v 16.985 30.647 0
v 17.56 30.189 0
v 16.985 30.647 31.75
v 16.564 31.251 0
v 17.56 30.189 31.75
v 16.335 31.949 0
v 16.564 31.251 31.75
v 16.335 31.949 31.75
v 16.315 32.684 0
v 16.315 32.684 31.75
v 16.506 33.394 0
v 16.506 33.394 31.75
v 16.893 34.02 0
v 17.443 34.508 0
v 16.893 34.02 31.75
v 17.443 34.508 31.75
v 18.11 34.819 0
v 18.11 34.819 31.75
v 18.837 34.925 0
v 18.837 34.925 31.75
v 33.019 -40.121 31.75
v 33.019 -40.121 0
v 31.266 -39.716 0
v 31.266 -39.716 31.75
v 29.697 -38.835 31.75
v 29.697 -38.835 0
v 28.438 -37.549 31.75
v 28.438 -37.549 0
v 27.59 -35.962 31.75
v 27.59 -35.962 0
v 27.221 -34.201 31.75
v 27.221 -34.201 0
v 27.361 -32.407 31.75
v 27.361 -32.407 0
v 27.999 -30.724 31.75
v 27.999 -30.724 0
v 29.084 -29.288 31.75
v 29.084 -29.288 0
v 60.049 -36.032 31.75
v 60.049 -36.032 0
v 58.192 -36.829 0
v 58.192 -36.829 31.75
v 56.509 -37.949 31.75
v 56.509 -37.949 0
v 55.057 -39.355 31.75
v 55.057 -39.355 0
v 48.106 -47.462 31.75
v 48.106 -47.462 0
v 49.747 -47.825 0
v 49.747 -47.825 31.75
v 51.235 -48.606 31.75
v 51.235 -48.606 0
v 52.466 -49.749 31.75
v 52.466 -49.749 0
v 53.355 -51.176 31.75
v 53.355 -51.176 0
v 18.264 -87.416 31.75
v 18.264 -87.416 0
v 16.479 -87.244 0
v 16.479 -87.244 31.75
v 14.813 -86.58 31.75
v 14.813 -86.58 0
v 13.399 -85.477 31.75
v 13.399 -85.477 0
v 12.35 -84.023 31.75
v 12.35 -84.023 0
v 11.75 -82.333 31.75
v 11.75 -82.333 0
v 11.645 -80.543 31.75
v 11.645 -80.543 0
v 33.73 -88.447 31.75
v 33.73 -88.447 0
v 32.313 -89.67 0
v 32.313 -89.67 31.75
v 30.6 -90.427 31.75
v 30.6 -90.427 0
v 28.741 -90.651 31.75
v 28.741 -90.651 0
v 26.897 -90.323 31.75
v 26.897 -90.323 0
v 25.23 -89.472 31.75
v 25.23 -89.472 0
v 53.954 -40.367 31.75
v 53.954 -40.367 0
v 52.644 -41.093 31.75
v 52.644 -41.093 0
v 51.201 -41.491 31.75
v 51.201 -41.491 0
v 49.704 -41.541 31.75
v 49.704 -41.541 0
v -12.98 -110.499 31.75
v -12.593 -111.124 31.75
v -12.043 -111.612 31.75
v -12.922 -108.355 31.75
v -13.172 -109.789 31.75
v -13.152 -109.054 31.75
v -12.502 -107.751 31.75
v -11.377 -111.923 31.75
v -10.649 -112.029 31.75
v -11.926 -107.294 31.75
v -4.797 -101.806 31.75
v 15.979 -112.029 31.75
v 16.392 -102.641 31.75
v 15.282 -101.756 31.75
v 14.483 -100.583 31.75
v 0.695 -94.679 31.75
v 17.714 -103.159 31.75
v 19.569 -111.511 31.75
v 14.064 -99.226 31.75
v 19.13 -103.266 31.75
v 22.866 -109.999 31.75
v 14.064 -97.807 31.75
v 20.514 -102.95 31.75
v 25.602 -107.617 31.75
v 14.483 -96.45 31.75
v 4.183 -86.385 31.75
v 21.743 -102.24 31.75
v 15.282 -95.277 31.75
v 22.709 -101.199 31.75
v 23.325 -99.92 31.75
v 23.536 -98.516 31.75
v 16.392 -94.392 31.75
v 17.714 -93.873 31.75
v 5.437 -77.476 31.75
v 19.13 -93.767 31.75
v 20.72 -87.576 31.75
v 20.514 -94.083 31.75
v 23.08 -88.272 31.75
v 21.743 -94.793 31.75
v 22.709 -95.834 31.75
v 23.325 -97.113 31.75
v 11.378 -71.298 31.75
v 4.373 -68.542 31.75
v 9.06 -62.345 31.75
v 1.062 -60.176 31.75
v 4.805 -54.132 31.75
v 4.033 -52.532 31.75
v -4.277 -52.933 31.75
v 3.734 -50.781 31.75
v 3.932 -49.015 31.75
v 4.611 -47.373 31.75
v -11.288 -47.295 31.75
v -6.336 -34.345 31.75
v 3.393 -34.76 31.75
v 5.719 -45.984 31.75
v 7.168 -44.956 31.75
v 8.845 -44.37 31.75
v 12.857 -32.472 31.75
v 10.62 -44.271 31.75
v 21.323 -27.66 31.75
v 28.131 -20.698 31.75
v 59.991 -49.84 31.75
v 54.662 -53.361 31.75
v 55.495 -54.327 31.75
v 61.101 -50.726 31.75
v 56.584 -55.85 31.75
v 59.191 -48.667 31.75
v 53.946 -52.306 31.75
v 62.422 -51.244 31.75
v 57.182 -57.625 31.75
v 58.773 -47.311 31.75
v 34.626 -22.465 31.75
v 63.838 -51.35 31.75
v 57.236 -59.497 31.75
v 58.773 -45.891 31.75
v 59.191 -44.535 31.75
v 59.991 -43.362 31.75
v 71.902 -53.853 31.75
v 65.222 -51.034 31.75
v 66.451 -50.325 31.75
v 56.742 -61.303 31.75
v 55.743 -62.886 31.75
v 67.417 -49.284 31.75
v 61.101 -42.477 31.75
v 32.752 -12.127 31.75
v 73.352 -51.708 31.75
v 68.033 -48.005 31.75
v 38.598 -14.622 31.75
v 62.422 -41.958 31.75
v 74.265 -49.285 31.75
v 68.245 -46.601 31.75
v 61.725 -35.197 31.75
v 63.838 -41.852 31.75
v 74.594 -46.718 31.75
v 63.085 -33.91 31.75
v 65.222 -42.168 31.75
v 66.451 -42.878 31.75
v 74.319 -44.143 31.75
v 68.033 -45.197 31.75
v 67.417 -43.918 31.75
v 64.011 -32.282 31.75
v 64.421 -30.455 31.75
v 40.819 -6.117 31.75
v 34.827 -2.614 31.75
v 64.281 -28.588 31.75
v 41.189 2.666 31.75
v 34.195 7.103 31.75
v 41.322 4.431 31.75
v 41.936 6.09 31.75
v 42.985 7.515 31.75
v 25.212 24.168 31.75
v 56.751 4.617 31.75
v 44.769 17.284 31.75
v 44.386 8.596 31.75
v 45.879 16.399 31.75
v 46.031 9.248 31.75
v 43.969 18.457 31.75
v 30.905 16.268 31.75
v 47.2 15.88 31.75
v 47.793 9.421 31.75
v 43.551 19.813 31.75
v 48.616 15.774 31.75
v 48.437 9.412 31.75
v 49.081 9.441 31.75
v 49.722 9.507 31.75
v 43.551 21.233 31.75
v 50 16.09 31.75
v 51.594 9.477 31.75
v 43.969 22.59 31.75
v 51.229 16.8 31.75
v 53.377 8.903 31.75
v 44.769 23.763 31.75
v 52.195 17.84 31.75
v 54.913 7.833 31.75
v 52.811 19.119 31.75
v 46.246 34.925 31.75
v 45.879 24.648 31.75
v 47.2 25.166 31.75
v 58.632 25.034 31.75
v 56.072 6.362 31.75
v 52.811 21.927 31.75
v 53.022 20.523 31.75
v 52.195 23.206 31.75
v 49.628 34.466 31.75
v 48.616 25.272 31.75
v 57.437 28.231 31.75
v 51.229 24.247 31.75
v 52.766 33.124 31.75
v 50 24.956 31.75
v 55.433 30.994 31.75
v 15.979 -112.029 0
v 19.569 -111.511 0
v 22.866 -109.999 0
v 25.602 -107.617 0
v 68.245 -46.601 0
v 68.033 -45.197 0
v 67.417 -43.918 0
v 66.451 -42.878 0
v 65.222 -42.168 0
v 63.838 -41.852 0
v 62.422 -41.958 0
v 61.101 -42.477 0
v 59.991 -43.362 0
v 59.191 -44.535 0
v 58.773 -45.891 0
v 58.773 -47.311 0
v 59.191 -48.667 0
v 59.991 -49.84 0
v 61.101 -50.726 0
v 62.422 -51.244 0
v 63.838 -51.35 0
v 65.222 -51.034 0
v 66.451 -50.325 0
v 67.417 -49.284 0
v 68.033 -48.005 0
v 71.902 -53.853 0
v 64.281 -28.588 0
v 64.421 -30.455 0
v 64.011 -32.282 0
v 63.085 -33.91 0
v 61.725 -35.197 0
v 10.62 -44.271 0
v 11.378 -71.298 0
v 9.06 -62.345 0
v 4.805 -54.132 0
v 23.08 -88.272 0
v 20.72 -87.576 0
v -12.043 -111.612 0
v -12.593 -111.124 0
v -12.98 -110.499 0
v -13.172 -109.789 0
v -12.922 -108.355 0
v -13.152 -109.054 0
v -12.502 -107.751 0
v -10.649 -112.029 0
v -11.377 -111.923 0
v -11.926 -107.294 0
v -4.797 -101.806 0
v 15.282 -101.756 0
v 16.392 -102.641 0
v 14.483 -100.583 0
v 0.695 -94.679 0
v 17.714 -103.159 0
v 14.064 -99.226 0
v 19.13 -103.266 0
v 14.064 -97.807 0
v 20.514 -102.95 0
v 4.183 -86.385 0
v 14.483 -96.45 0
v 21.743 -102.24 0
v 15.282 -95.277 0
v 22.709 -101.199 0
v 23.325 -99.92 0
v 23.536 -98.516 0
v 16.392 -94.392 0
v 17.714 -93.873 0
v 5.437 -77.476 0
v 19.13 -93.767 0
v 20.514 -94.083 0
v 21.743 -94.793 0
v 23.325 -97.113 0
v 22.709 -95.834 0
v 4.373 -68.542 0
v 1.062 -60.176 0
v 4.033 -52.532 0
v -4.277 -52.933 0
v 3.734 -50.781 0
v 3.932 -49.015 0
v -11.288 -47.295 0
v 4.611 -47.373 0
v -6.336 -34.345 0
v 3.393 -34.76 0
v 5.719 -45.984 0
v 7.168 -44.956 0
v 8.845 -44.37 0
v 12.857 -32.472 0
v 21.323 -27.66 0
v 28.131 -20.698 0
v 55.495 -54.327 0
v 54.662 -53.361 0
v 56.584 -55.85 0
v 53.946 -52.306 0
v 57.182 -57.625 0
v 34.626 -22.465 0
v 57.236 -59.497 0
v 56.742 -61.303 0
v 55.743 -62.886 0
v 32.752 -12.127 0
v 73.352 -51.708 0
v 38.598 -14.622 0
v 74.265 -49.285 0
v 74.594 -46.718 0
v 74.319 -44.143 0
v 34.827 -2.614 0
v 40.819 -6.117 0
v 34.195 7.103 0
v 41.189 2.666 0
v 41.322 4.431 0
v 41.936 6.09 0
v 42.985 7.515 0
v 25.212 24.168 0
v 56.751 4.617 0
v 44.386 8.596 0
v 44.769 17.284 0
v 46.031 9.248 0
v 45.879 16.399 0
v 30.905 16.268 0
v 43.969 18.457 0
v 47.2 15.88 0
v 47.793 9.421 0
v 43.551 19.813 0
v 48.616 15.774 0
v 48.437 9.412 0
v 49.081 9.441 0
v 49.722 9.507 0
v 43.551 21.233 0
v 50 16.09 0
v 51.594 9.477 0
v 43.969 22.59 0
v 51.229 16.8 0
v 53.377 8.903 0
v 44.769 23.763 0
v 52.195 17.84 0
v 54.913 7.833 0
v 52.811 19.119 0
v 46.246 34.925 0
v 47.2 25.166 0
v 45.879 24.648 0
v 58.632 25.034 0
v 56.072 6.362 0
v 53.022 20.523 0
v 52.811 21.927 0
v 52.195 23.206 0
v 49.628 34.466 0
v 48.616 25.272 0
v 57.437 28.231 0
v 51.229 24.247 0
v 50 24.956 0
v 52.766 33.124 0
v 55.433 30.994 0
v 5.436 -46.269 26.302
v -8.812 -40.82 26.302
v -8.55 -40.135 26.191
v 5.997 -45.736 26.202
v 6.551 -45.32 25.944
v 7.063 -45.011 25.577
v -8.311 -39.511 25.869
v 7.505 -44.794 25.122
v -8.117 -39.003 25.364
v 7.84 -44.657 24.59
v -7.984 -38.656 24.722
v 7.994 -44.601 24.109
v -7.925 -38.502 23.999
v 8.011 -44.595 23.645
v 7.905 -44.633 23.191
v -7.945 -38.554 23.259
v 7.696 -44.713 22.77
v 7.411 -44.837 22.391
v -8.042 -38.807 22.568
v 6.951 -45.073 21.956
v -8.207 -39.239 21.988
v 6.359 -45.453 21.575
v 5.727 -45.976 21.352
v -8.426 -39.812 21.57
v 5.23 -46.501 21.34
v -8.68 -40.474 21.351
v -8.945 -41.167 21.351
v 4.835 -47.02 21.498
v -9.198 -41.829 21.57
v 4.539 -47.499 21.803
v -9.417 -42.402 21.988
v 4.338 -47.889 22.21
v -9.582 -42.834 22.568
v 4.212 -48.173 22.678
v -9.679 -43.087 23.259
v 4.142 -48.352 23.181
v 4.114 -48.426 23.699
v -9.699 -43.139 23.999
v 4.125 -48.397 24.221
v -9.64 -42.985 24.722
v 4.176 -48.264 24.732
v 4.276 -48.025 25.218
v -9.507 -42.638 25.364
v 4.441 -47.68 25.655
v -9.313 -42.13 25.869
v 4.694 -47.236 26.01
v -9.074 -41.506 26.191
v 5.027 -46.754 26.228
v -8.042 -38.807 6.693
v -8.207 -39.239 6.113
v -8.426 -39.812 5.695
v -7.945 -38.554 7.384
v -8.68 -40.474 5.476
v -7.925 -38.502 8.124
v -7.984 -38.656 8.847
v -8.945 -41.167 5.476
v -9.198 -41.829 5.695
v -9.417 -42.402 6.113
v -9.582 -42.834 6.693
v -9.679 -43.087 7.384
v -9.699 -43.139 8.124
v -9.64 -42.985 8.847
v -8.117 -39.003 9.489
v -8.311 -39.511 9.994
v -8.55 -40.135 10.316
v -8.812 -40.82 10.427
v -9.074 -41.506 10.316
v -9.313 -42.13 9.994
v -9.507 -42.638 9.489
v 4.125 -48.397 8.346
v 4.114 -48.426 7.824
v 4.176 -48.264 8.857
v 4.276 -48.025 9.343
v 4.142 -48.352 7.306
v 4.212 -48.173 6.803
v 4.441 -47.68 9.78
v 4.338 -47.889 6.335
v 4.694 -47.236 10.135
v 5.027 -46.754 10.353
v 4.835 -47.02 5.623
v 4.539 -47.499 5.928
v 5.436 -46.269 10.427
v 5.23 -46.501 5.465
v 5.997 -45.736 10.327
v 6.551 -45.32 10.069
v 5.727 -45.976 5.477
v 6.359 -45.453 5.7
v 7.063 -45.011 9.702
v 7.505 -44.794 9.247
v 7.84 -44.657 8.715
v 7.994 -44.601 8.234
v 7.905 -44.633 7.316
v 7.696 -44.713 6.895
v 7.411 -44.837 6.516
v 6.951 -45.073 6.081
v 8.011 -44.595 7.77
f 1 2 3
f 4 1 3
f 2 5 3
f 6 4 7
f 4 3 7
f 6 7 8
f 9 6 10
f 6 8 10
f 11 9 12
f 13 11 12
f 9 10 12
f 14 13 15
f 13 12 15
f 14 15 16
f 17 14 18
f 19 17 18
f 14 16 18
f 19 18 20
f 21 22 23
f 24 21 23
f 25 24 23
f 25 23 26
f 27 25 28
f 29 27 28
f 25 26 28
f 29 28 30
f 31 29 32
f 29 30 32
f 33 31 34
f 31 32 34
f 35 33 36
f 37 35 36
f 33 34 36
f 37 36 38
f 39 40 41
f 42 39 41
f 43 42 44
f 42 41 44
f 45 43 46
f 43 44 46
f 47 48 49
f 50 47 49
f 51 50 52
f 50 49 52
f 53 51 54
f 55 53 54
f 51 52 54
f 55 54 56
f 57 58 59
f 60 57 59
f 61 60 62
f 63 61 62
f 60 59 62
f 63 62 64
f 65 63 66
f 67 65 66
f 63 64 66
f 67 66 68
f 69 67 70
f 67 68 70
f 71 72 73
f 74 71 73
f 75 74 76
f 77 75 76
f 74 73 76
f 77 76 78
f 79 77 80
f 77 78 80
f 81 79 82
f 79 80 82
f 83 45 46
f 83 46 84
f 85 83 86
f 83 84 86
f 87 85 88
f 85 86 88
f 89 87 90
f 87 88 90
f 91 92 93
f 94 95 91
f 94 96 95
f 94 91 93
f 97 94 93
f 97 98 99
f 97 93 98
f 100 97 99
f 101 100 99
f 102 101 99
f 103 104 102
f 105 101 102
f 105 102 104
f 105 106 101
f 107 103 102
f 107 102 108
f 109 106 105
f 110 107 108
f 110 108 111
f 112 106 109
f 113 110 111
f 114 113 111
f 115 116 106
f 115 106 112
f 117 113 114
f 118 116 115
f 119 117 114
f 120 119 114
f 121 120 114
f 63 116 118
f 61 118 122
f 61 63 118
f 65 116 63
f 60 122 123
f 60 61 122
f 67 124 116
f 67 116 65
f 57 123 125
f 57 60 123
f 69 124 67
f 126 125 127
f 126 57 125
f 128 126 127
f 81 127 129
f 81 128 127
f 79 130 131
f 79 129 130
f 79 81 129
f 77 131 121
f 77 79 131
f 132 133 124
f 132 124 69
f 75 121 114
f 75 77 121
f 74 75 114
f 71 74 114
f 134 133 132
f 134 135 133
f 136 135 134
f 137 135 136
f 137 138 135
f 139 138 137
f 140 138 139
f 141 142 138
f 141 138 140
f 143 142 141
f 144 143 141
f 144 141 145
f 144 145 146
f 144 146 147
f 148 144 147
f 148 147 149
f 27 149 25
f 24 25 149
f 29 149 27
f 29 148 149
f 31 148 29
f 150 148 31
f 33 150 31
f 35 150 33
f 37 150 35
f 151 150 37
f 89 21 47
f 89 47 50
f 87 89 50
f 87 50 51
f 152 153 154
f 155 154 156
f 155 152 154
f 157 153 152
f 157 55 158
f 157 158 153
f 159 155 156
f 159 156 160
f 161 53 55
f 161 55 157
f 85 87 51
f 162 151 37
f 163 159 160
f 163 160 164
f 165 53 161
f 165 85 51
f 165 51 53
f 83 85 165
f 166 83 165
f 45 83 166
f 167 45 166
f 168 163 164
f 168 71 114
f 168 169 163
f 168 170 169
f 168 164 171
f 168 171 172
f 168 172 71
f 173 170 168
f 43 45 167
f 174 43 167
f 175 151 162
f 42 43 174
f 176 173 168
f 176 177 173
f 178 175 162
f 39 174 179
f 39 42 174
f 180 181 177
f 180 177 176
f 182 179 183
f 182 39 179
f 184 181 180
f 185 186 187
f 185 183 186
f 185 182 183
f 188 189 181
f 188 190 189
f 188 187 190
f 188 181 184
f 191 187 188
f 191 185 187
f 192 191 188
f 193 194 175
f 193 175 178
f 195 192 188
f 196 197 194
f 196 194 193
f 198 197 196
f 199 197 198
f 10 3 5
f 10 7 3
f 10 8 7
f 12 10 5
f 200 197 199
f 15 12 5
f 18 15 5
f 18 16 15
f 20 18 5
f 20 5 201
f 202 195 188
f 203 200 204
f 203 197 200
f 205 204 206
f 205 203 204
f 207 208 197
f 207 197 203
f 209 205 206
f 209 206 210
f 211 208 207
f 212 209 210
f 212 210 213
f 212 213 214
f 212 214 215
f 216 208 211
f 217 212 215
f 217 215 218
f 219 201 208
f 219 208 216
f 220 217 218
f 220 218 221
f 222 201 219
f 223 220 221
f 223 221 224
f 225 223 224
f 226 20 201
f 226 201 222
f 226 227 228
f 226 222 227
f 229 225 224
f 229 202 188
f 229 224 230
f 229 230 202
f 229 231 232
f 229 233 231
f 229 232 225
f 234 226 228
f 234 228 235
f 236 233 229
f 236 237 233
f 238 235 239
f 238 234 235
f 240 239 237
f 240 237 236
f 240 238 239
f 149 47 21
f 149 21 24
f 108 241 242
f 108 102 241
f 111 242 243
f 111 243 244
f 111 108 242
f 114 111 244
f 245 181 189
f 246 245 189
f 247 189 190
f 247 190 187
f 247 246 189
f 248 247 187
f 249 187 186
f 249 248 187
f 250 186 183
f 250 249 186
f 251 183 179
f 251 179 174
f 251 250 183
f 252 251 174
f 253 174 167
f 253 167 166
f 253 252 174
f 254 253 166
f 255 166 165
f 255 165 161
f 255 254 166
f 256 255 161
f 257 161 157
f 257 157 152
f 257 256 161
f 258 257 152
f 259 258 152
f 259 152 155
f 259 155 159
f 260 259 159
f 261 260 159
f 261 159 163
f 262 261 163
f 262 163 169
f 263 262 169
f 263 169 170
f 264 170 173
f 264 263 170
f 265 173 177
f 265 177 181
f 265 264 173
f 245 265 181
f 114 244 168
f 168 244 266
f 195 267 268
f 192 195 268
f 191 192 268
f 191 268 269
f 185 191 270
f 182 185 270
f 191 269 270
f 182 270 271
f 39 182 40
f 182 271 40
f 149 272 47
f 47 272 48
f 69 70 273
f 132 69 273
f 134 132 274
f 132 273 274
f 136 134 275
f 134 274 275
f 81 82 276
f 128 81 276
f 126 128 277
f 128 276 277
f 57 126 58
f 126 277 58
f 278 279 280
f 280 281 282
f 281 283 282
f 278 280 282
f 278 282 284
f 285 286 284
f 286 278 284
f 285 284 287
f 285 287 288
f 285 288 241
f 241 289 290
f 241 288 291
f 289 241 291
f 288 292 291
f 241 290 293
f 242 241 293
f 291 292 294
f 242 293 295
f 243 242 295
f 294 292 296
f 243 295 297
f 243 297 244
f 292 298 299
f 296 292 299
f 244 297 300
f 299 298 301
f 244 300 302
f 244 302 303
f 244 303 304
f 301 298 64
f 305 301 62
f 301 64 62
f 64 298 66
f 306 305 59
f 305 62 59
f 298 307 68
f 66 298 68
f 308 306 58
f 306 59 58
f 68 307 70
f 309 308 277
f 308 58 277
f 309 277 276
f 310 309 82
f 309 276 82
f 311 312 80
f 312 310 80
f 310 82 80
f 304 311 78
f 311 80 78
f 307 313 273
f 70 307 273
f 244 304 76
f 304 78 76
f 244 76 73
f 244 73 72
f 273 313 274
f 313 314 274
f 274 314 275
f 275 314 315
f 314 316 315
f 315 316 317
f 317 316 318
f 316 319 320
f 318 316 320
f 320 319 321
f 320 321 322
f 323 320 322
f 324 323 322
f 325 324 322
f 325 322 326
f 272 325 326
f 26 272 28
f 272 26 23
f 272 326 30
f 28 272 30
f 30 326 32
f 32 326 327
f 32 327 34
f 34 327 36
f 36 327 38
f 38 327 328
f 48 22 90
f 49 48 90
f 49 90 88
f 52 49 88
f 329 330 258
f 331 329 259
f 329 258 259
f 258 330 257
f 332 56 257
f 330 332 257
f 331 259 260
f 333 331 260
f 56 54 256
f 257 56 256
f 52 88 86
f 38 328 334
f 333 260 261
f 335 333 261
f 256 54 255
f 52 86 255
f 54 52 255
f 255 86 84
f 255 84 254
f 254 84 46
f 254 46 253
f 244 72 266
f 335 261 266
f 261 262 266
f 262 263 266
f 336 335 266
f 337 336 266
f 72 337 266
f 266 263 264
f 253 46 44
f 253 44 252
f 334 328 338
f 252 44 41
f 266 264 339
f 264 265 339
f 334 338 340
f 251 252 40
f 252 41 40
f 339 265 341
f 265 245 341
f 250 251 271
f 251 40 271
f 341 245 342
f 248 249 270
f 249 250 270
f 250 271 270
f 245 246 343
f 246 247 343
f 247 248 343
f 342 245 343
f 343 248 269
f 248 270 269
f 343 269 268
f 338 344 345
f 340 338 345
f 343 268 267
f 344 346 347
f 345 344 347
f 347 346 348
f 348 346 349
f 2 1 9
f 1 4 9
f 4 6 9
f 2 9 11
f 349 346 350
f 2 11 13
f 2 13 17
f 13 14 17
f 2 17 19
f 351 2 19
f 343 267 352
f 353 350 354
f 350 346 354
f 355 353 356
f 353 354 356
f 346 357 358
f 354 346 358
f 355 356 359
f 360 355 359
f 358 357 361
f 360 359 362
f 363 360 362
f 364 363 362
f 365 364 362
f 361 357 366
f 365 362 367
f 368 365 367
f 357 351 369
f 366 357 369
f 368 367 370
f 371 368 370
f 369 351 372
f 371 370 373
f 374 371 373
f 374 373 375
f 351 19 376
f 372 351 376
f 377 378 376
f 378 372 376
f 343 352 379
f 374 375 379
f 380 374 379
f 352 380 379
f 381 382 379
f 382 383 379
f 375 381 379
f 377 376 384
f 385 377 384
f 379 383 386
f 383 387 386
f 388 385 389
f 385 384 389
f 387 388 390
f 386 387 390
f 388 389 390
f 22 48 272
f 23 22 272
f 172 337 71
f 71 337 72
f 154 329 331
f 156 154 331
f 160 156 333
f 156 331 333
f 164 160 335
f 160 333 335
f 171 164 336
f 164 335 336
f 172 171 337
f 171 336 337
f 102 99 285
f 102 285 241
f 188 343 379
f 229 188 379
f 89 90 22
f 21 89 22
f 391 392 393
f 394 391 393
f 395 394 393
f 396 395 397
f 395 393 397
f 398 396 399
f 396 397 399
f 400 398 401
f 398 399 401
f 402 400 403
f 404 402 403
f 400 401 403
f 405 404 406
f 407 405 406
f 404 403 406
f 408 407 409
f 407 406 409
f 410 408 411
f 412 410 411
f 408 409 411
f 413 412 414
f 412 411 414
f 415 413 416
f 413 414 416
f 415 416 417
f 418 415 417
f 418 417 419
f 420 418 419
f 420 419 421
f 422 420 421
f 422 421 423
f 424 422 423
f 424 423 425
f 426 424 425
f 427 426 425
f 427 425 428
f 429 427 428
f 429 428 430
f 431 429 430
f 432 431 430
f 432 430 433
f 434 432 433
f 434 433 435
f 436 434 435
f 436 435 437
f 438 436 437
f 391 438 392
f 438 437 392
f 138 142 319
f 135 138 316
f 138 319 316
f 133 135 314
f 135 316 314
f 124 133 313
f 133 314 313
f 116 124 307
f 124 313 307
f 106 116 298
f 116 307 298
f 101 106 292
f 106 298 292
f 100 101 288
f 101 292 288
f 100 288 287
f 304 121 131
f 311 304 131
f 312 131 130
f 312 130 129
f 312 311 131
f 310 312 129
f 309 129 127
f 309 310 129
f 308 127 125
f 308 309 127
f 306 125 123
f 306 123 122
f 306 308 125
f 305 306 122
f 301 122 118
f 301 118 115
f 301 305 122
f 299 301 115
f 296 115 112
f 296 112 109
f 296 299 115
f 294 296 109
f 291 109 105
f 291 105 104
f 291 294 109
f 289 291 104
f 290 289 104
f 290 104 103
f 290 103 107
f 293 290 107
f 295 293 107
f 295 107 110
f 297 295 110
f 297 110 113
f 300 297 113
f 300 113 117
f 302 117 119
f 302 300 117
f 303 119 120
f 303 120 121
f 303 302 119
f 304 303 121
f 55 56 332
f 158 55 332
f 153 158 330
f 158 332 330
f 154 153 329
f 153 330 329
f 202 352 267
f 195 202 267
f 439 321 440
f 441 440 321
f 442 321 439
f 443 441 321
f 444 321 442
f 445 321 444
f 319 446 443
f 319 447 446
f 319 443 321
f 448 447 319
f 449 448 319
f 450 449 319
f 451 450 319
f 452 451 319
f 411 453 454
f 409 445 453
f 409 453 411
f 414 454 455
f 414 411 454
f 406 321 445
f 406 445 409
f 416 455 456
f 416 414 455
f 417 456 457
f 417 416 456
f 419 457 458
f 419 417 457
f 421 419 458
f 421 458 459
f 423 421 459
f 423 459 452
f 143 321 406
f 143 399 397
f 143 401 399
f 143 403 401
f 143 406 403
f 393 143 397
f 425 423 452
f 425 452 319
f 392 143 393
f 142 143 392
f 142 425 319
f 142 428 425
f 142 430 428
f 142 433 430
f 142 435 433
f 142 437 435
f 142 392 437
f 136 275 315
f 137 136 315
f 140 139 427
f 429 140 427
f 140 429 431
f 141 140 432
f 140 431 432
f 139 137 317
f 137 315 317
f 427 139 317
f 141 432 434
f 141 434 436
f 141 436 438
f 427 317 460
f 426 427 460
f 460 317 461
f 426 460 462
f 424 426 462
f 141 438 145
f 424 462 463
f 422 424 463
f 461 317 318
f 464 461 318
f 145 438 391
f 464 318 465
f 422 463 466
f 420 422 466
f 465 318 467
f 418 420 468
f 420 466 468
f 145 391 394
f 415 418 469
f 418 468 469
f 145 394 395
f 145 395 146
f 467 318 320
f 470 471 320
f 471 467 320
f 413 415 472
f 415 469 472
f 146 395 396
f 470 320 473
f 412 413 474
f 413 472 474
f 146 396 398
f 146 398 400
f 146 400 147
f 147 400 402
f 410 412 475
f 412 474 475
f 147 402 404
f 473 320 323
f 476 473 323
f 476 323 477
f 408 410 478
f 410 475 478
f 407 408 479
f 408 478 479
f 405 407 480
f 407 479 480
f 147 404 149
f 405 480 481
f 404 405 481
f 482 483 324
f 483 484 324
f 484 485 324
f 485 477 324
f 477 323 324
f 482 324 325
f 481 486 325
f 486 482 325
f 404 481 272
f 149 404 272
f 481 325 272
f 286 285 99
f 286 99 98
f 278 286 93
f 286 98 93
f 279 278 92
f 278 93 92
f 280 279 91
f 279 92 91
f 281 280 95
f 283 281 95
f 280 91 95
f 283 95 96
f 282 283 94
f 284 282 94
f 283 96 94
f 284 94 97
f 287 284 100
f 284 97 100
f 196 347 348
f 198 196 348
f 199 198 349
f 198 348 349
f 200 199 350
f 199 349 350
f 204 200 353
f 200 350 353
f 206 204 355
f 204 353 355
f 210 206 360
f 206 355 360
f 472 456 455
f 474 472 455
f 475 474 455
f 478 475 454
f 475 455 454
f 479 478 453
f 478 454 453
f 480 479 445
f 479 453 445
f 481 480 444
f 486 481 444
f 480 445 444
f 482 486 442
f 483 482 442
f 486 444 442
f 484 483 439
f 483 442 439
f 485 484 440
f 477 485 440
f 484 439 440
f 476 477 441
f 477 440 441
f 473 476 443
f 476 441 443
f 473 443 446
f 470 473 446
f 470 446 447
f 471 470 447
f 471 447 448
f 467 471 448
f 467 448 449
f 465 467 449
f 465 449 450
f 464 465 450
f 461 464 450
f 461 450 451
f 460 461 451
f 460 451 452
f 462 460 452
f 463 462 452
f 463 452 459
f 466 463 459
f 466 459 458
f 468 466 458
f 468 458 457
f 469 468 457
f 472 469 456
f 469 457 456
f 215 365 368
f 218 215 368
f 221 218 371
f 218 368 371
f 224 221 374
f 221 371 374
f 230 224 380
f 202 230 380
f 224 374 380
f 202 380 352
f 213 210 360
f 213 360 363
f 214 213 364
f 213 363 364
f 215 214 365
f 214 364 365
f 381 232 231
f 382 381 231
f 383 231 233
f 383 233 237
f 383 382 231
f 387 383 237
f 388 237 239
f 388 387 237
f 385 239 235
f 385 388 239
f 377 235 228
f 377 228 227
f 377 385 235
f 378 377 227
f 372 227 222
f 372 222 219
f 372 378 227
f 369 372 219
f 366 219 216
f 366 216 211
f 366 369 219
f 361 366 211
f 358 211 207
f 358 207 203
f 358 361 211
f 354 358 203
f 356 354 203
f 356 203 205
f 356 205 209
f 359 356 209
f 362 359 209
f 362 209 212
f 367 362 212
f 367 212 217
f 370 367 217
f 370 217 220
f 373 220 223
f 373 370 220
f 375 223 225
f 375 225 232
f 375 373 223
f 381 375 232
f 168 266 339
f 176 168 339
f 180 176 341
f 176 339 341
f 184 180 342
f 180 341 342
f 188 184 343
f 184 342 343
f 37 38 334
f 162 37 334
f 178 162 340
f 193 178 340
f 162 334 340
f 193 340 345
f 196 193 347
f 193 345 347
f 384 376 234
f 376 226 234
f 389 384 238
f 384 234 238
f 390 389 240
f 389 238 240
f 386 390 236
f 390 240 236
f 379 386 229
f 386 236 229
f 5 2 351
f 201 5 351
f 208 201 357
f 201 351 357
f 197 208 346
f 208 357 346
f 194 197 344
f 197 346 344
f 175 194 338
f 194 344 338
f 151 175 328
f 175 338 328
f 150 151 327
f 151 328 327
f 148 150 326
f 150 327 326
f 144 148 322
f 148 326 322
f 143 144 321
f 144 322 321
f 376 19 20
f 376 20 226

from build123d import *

# Parameters (mm, degrees)
SKETCH1_R           = 4.7625
BOSS_EXTRUDE1_DEPTH = 31.75
SKETCH2_R           = 2.4892
CUT_EXTRUDE1_DEPTH  = 25.4
SKETCH3_W           = 64.987057328
SKETCH3_H           = 9.244924149
SKETCH3_W_2         = 60.957372158
SKETCH3_H_2         = 11.477125068
CUT_EXTRUDE2_DEPTH  = 32.7500001
FILLET1_R           = 2.54
FILLET2_R           = 12.7


with BuildPart() as part:
    # Sketch1 → Boss-Extrude1 (new body)
    with BuildSketch(Plane.XY):
        with BuildLine():
            Line((-12.474995441, -32.621007246), (-17.01135742, -44.483191699))
            ThreePointArc((-17.01135742, -44.483191699), (4.857819156, -83.447185108), (-29.486352861, -112.029198945))
            Line((-29.486352861, -112.029198945), (-29.486352861, -117.566398945))
            Line((-29.486352861, -117.566398945), (17.033444212, -117.566398945))
            Line((17.033444212, -117.566398945), (71.902434201, -53.852584939))
            ThreePointArc((71.902434201, -53.852584939), (74.265423414, -49.285430405), (74.319342365, -44.143474424))
            Line((74.319342365, -44.143474424), (55.334619846, 39.5732))
            Line((55.334619846, 39.5732), (0, 39.5732))
            Line((0, 39.5732), (0, 34.925))
            ThreePointArc((0, 34.925), (34.344172017, -6.342986163), (-12.474995441, -32.621007246))
        make_face()
        with Locations((18.773647139, -98.516398945)):
            Circle(SKETCH1_R, mode=Mode.SUBTRACT)
        with BuildLine():
            ThreePointArc((4.805346172, -54.132368316), (4.611000081, -47.373075962), (10.619637037, -44.271127306))
            Line((10.619637037, -44.271127306), (48.106372009, -47.462477992))
            ThreePointArc((48.106372009, -47.462477992), (51.235190632, -48.60574982), (53.354739272, -51.17559223))
            ThreePointArc((53.354739272, -51.17559223), (54.288815903, -52.843916254), (55.495053497, -54.327423945))
            ThreePointArc((55.495053497, -54.327423945), (57.278420501, -58.558773894), (55.742748768, -62.886178727))
            Line((55.742748768, -62.886178727), (33.730414898, -88.446877882))
            ThreePointArc((33.730414898, -88.446877882), (29.678710415, -90.607528488), (25.229617999, -89.471616111))
            ThreePointArc((25.229617999, -89.471616111), (21.919602705, -87.858508918), (18.264177504, -87.415583797))
            ThreePointArc((18.264177504, -87.415583797), (13.399411545, -85.477293546), (11.645131351, -80.543185934))
            ThreePointArc((11.645131351, -80.543185934), (10.470460882, -66.756317013), (4.805346172, -54.132368316))
        make_face(mode=Mode.SUBTRACT)
        with Locations((63.482010487, -46.601094008)):
            Circle(SKETCH1_R, mode=Mode.SUBTRACT)
        with BuildLine():
            Line((49.704289076, -41.541119878), (33.019297292, -40.120679821))
            ThreePointArc((33.019297292, -40.120679821), (27.589635384, -35.961933342), (29.083549865, -29.28775772))
            ThreePointArc((29.083549865, -29.28775772), (38.598079931, -14.622374999), (41.18881011, 2.665998258))
            ThreePointArc((41.18881011, 2.665998258), (42.985049027, 7.515335292), (47.792622808, 9.420532987))
            ThreePointArc((47.792622808, 9.420532987), (48.759316239, 9.421923517), (49.722231073, 9.507323433))
            ThreePointArc((49.722231073, 9.507323433), (54.184633542, 8.424879689), (56.750552758, 4.616890871))
            Line((56.750552758, 4.616890871), (64.280599338, -28.588253807))
            ThreePointArc((64.280599338, -28.588253807), (63.608310734, -33.130582317), (60.049355437, -36.032057365))
            ThreePointArc((60.049355437, -36.032057365), (57.324876061, -37.350291237), (55.057143591, -39.354765694))
            ThreePointArc((55.057143591, -39.354765694), (52.644006558, -41.092556671), (49.704289076, -41.541119878))
        make_face(mode=Mode.SUBTRACT)
        with Locations((48.26, 20.5232)):
            Circle(SKETCH1_R, mode=Mode.SUBTRACT)
    extrude(amount=BOSS_EXTRUDE1_DEPTH)

    # Sketch2 → Cut-Extrude1 (cut)
    with BuildSketch(Plane(origin=(0, 0, 0), x_dir=(0, 0, 1), z_dir=(-0.934030272, 0.357193857, 0))):
        with Locations((7.9375, -41.275)):
            Circle(SKETCH2_R)
        with Locations((23.8125, -41.275)):
            Circle(SKETCH2_R)
    extrude(amount=-CUT_EXTRUDE1_DEPTH, mode=Mode.SUBTRACT)

    # Sketch3 → Cut-Extrude2 (cut, through all)
    with BuildSketch(Plane.XY.offset(31.75)):
        Polygon((-17.01135742, -44.483191699), (-12.474995441, -32.621007246), (-5.676500584, -32.621007246), (-11.862088463, -48.795771234), align=None)
        with Locations((32.493528664, 39.547462075)):
            Rectangle(SKETCH3_W, SKETCH3_H)
        with Locations((0.992333218, -117.767761479)):
            Rectangle(SKETCH3_W_2, SKETCH3_H_2)
    extrude(amount=-CUT_EXTRUDE2_DEPTH, mode=Mode.SUBTRACT)

    # Fillet1
    fillet1_edges = [part.edges().sort_by_distance(p)[0] for p in [
        (-29.486352861, -112.029198945, 15.875),
        (0, 34.925, 15.875),
    ]]
    fillet(fillet1_edges, radius=FILLET1_R)

    # Fillet2
    fillet2_edges = [part.edges().sort_by_distance(p)[0] for p in [
        (56.388708387, 34.925, 15.875),
        (21.801963819, -112.029198945, 15.875),
    ]]
    fillet(fillet2_edges, radius=FILLET2_R)


solid = part.part
